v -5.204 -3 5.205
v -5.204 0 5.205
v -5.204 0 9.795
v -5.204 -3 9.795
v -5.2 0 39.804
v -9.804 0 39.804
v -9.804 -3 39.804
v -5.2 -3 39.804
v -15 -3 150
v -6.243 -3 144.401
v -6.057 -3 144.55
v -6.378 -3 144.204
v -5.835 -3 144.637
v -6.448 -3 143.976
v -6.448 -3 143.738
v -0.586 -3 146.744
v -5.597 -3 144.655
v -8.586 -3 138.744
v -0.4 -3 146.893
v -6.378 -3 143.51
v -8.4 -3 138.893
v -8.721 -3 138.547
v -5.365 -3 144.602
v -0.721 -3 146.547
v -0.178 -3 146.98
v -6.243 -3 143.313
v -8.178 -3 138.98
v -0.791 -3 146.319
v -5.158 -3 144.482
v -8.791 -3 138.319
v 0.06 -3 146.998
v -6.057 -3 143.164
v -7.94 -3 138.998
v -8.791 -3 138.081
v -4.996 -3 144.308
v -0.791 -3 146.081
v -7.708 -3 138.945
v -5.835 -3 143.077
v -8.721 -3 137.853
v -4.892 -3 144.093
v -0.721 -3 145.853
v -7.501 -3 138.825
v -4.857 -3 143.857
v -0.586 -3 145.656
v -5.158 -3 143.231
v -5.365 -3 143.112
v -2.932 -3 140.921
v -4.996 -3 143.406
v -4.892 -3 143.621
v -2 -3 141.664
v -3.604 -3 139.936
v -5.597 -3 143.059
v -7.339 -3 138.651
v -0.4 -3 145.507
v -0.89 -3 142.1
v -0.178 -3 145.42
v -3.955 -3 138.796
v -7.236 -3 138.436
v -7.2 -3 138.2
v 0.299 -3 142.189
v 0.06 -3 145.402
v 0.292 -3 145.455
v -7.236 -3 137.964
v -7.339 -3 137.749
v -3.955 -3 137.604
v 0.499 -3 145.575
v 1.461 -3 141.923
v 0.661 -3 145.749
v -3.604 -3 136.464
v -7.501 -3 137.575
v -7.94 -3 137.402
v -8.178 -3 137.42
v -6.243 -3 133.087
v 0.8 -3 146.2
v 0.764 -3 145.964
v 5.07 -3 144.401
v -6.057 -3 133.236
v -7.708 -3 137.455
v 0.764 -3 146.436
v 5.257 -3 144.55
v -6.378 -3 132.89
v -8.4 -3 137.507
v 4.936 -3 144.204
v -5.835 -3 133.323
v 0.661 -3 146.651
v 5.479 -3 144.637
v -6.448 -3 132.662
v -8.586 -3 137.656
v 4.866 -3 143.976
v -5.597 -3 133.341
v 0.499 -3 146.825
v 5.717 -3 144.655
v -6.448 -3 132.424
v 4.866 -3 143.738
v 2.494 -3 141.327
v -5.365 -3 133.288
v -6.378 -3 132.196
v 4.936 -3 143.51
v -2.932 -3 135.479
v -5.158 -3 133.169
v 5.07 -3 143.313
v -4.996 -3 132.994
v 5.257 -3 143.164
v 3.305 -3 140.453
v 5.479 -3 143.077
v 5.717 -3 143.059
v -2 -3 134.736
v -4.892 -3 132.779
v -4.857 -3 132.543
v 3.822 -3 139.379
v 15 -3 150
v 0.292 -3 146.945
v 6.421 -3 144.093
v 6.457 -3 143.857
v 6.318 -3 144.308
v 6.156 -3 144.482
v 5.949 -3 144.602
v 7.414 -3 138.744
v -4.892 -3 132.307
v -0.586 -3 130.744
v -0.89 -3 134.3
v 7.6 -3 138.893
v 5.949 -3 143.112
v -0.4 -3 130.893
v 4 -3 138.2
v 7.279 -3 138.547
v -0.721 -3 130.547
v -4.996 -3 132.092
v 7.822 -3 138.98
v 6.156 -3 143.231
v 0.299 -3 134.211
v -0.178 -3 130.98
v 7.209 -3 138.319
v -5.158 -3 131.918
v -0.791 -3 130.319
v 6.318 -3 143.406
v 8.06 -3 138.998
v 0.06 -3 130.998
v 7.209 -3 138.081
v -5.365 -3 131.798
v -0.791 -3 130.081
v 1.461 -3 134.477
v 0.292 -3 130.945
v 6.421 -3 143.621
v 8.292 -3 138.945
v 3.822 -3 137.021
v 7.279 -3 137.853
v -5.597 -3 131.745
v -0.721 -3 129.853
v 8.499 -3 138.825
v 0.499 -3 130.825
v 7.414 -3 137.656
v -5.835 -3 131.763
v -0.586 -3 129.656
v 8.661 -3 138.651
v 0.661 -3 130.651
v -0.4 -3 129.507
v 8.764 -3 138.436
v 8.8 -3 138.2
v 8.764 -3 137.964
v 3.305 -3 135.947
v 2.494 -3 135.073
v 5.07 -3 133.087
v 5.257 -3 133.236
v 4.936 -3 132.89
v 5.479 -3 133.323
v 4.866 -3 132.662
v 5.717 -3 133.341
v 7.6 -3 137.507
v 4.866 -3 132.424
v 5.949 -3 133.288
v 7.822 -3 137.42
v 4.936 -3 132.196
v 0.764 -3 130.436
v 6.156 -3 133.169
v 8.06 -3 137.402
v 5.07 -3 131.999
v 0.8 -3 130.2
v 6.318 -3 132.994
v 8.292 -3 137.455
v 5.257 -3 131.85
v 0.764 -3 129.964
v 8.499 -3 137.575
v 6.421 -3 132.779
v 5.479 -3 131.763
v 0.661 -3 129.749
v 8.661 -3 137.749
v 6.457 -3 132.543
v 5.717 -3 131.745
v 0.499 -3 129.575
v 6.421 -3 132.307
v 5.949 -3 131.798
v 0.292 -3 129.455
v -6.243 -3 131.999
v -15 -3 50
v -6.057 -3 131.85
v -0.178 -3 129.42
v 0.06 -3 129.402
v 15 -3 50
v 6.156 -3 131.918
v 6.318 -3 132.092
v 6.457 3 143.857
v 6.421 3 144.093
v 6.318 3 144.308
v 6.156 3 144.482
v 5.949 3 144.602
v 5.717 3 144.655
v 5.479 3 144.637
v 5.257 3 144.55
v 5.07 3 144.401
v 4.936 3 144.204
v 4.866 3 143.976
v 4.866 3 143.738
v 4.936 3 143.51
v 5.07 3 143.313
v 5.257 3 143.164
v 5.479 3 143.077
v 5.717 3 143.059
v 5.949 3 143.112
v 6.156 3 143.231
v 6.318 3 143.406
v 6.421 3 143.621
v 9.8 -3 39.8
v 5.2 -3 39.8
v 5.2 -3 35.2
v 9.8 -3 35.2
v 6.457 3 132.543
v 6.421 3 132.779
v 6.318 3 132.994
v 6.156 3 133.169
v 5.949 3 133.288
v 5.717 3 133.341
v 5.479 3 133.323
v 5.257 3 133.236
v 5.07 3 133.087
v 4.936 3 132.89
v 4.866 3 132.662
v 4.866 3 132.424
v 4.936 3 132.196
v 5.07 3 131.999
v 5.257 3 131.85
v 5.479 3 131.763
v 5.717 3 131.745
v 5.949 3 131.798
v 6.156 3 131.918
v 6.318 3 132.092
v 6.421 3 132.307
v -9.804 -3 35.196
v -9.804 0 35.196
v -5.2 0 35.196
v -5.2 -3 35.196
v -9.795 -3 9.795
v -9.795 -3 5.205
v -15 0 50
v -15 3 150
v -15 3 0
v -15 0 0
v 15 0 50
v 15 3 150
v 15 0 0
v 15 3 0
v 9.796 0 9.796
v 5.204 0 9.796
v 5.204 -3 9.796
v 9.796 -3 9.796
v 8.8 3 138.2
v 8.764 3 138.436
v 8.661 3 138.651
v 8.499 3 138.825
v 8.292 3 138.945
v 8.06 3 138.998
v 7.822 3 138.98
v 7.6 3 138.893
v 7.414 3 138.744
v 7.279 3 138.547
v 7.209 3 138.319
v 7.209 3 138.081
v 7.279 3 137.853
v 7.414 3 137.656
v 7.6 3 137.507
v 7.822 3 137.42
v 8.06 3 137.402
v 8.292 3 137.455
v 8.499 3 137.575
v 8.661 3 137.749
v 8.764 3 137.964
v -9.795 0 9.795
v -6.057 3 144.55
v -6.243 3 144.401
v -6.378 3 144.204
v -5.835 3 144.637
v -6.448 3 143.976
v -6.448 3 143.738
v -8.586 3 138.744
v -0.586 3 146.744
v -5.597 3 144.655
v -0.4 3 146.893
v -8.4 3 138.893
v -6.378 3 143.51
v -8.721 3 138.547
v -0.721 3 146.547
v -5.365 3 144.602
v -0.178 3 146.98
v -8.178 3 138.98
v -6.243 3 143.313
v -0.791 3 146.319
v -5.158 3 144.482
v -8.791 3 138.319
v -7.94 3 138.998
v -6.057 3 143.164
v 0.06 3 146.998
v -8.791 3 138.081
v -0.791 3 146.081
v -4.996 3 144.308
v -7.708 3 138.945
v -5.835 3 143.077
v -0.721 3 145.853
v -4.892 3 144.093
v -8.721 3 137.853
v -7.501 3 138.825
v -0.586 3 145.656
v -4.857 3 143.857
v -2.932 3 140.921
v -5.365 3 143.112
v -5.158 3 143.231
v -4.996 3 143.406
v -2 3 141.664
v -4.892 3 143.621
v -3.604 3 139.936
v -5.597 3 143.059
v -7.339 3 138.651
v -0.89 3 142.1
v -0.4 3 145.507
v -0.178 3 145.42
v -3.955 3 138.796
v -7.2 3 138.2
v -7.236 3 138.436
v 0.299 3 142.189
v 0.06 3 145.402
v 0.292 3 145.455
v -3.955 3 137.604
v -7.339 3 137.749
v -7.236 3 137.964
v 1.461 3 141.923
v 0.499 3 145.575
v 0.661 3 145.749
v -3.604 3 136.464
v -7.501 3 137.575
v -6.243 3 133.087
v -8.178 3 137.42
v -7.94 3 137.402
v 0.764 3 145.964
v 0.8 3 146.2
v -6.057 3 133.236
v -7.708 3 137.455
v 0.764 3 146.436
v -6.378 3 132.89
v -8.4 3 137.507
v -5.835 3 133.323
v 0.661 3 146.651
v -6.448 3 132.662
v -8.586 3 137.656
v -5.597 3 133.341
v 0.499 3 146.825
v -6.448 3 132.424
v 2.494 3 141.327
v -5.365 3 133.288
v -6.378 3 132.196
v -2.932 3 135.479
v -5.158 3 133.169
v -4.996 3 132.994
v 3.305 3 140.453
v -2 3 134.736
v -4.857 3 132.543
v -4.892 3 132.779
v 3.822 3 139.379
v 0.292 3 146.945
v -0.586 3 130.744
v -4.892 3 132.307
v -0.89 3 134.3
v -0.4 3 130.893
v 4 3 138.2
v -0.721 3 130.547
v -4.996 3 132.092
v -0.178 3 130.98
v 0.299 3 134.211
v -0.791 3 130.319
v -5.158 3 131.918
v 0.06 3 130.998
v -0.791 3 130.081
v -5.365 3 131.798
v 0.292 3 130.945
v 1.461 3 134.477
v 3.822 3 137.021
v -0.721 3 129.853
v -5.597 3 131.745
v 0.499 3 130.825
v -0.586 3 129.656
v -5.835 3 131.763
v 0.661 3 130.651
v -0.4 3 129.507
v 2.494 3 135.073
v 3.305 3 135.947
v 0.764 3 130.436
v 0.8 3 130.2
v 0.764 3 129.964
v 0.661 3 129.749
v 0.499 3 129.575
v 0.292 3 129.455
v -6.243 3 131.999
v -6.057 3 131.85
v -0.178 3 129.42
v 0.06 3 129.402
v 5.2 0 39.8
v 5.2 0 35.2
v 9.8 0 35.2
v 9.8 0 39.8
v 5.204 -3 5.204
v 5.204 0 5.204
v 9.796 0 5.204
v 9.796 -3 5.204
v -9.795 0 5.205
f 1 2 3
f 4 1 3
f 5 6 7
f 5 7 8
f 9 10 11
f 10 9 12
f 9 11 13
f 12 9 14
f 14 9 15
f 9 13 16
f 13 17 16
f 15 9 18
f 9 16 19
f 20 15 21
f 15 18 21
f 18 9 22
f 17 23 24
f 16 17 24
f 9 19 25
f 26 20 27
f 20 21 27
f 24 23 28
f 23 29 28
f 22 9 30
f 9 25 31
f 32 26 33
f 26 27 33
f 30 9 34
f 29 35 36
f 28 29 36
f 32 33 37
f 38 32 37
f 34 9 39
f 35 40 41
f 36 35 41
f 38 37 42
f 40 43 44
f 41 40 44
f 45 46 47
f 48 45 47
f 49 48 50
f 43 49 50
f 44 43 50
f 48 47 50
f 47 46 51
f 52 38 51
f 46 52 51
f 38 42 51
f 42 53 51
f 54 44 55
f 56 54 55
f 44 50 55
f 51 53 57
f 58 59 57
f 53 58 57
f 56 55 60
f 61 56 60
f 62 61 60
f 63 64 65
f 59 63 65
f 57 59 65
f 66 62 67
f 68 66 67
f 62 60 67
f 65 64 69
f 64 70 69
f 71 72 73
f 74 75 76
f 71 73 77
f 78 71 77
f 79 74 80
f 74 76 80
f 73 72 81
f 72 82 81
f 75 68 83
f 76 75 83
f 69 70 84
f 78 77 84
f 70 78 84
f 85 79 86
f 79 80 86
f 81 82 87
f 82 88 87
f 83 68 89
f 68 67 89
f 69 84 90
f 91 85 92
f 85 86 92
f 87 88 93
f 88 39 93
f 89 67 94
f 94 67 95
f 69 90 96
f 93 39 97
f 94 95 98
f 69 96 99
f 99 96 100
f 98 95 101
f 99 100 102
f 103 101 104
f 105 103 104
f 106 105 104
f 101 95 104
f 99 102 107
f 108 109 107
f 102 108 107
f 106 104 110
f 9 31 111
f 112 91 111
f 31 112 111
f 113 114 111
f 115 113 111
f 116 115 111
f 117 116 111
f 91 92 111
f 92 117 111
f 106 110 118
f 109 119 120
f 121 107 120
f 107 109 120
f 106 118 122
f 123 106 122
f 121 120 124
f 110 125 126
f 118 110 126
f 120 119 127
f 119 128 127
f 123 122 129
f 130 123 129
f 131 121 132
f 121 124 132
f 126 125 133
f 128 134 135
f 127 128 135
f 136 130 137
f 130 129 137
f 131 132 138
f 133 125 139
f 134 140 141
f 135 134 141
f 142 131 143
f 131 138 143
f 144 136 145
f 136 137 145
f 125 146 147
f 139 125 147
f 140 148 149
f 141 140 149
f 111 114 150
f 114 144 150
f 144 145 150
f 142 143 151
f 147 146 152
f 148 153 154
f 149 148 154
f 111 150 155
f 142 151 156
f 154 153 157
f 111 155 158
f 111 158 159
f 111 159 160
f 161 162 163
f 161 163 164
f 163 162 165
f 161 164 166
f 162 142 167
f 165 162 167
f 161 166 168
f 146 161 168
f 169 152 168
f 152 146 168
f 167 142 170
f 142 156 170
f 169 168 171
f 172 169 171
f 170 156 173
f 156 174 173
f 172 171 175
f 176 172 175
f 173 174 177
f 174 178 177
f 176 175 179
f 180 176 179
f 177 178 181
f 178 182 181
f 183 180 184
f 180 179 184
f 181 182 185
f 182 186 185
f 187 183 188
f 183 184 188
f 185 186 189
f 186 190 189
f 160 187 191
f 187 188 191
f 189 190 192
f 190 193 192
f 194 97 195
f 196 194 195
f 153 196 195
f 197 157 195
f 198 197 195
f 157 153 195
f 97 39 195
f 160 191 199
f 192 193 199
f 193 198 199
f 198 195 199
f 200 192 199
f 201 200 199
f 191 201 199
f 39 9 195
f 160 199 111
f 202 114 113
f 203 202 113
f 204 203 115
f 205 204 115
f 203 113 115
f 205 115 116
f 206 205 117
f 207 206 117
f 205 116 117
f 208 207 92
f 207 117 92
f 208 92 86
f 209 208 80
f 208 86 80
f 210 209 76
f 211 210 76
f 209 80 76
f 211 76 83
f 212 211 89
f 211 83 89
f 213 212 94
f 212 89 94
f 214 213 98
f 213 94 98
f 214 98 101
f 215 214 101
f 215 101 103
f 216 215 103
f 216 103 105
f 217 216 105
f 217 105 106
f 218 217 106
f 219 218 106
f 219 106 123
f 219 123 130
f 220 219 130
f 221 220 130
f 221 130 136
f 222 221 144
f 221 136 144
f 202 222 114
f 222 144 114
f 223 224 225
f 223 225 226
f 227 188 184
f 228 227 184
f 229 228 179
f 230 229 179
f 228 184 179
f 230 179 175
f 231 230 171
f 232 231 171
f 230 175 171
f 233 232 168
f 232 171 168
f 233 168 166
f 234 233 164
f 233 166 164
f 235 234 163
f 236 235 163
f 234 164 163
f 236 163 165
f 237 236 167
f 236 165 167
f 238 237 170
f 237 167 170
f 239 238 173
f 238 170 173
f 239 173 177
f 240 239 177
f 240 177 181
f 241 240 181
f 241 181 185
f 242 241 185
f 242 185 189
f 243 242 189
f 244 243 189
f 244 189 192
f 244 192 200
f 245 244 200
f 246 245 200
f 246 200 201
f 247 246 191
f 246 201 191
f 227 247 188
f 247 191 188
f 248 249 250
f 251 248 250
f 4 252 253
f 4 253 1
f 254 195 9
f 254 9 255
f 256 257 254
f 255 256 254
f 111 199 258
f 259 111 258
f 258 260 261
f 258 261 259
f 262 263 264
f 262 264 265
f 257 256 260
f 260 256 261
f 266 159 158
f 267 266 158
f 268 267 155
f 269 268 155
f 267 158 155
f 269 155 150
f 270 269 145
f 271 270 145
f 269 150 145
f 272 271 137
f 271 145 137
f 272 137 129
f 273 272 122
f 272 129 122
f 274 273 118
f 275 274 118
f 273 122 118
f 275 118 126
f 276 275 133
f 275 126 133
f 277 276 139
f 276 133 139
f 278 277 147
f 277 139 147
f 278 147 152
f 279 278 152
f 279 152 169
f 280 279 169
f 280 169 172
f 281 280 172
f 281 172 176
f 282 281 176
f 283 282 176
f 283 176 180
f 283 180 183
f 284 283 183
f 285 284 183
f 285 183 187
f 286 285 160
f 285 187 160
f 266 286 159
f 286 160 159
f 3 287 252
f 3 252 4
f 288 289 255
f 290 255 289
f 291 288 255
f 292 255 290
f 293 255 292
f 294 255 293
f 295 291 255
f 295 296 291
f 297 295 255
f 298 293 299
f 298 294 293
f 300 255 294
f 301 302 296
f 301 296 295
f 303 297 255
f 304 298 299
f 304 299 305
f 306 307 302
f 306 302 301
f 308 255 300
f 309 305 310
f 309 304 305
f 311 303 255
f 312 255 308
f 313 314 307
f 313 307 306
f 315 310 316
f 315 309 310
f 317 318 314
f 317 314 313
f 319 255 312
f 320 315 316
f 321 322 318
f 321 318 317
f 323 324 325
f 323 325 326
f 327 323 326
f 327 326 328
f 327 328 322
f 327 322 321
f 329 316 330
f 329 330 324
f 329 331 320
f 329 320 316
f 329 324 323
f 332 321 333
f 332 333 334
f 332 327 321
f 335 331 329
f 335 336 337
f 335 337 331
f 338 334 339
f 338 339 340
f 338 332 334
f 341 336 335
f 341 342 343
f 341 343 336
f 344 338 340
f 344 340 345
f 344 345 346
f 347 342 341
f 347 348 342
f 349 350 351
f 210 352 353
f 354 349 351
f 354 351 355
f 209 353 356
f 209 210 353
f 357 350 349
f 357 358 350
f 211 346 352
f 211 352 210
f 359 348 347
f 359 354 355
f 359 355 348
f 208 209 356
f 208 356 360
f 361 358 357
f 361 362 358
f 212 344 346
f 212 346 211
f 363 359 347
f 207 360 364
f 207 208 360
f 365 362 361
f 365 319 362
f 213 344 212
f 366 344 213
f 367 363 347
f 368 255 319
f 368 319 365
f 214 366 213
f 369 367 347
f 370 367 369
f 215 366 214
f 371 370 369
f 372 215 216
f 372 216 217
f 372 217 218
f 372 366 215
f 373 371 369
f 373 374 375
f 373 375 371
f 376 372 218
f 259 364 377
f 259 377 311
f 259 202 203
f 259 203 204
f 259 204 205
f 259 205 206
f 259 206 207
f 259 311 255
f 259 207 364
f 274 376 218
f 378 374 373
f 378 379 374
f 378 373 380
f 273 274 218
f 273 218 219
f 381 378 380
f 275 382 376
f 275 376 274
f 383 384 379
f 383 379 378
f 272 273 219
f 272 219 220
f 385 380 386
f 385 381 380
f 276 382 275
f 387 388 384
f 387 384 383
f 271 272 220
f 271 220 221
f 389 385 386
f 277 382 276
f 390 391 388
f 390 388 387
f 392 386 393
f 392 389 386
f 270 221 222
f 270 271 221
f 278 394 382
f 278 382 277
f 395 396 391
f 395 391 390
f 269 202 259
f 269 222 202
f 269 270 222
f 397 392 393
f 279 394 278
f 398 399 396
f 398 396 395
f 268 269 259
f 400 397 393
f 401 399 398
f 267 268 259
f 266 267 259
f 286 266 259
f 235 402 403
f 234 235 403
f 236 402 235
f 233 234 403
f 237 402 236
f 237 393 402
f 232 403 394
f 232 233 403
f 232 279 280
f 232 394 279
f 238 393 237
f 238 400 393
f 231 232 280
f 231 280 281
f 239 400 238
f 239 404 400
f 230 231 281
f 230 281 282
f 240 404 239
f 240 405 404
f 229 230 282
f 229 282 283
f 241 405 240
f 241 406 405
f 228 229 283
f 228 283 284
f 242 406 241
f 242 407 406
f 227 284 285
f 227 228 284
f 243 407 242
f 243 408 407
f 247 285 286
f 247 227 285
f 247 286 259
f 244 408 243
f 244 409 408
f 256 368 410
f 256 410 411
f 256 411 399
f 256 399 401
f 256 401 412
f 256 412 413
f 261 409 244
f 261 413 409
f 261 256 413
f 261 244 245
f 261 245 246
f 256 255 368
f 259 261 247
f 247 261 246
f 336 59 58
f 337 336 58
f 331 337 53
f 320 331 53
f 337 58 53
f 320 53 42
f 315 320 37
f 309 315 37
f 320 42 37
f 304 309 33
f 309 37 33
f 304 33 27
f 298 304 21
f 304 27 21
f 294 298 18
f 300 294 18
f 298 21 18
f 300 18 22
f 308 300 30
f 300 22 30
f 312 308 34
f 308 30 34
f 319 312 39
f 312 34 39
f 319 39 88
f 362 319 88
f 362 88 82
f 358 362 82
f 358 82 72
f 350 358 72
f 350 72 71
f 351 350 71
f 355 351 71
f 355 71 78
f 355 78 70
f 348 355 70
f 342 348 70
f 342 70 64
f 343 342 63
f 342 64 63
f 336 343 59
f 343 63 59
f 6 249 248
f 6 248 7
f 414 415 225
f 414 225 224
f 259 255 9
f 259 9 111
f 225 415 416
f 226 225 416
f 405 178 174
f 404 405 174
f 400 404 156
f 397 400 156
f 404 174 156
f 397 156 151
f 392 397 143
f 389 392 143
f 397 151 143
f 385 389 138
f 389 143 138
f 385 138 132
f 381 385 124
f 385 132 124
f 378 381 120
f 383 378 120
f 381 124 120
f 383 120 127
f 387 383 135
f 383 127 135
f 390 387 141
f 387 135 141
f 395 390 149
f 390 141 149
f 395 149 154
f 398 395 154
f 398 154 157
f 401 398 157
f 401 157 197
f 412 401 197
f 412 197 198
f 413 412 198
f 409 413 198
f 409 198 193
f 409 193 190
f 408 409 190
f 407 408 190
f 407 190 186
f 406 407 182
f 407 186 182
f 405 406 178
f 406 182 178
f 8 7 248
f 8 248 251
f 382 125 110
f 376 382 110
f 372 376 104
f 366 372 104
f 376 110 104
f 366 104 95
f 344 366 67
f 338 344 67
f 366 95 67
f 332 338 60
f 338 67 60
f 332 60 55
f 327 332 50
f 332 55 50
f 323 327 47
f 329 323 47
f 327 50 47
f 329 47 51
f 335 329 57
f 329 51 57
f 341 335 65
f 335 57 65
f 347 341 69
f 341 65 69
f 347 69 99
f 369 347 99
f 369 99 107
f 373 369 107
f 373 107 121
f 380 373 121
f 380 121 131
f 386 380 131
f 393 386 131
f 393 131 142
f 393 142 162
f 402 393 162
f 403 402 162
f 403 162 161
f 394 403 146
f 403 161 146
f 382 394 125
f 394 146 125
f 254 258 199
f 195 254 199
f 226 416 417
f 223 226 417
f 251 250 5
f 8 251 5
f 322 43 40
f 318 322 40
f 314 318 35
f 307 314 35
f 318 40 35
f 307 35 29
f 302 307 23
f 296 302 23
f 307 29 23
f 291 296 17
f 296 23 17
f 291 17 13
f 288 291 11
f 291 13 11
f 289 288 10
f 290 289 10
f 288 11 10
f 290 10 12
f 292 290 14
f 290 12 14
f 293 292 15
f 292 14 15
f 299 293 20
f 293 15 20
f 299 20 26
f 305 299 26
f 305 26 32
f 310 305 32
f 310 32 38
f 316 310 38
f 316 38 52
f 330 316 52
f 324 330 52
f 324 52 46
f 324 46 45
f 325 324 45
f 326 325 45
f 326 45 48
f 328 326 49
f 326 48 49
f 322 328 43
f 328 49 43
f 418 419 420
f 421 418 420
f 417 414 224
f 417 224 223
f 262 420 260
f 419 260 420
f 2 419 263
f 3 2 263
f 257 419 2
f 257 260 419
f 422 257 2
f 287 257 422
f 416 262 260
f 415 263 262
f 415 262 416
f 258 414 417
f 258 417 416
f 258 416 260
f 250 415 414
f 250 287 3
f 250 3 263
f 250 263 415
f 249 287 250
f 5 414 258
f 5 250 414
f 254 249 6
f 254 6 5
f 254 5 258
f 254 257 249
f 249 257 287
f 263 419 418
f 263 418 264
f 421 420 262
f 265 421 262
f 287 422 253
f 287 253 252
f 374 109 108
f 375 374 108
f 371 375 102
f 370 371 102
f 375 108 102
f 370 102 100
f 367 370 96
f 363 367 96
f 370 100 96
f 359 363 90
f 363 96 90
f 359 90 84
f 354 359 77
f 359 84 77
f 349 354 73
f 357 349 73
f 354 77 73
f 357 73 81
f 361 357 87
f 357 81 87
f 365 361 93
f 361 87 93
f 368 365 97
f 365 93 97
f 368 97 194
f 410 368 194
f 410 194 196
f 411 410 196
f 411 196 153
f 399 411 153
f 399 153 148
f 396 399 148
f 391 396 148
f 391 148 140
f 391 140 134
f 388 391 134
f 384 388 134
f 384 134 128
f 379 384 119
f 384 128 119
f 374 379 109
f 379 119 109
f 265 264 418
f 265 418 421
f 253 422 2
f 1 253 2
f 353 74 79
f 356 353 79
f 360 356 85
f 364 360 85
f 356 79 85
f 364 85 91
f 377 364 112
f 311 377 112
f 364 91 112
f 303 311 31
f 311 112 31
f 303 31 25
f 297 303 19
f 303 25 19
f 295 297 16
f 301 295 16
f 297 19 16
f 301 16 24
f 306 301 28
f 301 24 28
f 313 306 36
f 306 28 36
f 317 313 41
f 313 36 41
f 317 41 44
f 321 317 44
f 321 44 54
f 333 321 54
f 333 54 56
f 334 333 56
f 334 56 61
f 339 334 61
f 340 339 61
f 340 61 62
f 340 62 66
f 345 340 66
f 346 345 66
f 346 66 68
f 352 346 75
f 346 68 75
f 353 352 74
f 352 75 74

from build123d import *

# Parameters (mm, degrees)
F0_W     = 30
F0_H     = 6
F1_DEPTH = 150
F2_R     = 0.8
F2_R_2   = 4
F3_DEPTH = 6
F4_W     = 3
F4_H     = 50
F5_DEPTH = 30
F6_W     = 4.604
F6_H     = 4.608
F6_W_2   = 4.599998
F6_H_2   = 4.599998
F6_W_3   = 4.591
F6_H_3   = 4.59
F6_W_4   = 4.592
F6_H_4   = 4.592
F7_DEPTH = 3


with BuildPart() as f1:
    # F0 (on Top) → F1 (new body)
    with BuildSketch(Plane.XY):
        Rectangle(F0_W, F0_H)
    extrude(amount=F1_DEPTH)

    # F2 (on face) → F3 (cut, through all)
    with BuildSketch(Plane.XZ.offset(3)):
        with Locations((0, 146.2)):
            Circle(F2_R)
        with Locations((0, 138.2)):
            Circle(F2_R_2)
        with Locations((-5.656854, 143.856854)):
            Circle(F2_R)
        with Locations((-8, 138.2)):
            Circle(F2_R)
        with Locations((-5.656854, 132.543146)):
            Circle(F2_R)
        with Locations((0, 130.2)):
            Circle(F2_R)
        with Locations((5.656854, 132.543146)):
            Circle(F2_R)
        with Locations((8, 138.2)):
            Circle(F2_R)
        with Locations((5.656854, 143.856854)):
            Circle(F2_R)
    extrude(amount=-F3_DEPTH, mode=Mode.SUBTRACT)

    # F4 (on face) → F5 (cut, through all)
    with BuildSketch(Plane(origin=(-15, 0, 0), x_dir=(0, -1, 0), z_dir=(-1, 0, 0))):
        with Locations((1.5, 25)):
            Rectangle(F4_W, F4_H)
    extrude(amount=-F5_DEPTH, mode=Mode.SUBTRACT)

    # F6 (on face) → F7 (join)
    with BuildSketch(Plane.XZ):
        with Locations((-7.502, 37.5)):
            Rectangle(F6_W, F6_H)
        with Locations((7.5, 37.5)):
            Rectangle(F6_W_2, F6_H_2)
        with Locations((-7.4995, 7.5)):
            Rectangle(F6_W_3, F6_H_3)
        with Locations((7.5, 7.5)):
            Rectangle(F6_W_4, F6_H_4)
    extrude(amount=F7_DEPTH)


solid = f1.part
